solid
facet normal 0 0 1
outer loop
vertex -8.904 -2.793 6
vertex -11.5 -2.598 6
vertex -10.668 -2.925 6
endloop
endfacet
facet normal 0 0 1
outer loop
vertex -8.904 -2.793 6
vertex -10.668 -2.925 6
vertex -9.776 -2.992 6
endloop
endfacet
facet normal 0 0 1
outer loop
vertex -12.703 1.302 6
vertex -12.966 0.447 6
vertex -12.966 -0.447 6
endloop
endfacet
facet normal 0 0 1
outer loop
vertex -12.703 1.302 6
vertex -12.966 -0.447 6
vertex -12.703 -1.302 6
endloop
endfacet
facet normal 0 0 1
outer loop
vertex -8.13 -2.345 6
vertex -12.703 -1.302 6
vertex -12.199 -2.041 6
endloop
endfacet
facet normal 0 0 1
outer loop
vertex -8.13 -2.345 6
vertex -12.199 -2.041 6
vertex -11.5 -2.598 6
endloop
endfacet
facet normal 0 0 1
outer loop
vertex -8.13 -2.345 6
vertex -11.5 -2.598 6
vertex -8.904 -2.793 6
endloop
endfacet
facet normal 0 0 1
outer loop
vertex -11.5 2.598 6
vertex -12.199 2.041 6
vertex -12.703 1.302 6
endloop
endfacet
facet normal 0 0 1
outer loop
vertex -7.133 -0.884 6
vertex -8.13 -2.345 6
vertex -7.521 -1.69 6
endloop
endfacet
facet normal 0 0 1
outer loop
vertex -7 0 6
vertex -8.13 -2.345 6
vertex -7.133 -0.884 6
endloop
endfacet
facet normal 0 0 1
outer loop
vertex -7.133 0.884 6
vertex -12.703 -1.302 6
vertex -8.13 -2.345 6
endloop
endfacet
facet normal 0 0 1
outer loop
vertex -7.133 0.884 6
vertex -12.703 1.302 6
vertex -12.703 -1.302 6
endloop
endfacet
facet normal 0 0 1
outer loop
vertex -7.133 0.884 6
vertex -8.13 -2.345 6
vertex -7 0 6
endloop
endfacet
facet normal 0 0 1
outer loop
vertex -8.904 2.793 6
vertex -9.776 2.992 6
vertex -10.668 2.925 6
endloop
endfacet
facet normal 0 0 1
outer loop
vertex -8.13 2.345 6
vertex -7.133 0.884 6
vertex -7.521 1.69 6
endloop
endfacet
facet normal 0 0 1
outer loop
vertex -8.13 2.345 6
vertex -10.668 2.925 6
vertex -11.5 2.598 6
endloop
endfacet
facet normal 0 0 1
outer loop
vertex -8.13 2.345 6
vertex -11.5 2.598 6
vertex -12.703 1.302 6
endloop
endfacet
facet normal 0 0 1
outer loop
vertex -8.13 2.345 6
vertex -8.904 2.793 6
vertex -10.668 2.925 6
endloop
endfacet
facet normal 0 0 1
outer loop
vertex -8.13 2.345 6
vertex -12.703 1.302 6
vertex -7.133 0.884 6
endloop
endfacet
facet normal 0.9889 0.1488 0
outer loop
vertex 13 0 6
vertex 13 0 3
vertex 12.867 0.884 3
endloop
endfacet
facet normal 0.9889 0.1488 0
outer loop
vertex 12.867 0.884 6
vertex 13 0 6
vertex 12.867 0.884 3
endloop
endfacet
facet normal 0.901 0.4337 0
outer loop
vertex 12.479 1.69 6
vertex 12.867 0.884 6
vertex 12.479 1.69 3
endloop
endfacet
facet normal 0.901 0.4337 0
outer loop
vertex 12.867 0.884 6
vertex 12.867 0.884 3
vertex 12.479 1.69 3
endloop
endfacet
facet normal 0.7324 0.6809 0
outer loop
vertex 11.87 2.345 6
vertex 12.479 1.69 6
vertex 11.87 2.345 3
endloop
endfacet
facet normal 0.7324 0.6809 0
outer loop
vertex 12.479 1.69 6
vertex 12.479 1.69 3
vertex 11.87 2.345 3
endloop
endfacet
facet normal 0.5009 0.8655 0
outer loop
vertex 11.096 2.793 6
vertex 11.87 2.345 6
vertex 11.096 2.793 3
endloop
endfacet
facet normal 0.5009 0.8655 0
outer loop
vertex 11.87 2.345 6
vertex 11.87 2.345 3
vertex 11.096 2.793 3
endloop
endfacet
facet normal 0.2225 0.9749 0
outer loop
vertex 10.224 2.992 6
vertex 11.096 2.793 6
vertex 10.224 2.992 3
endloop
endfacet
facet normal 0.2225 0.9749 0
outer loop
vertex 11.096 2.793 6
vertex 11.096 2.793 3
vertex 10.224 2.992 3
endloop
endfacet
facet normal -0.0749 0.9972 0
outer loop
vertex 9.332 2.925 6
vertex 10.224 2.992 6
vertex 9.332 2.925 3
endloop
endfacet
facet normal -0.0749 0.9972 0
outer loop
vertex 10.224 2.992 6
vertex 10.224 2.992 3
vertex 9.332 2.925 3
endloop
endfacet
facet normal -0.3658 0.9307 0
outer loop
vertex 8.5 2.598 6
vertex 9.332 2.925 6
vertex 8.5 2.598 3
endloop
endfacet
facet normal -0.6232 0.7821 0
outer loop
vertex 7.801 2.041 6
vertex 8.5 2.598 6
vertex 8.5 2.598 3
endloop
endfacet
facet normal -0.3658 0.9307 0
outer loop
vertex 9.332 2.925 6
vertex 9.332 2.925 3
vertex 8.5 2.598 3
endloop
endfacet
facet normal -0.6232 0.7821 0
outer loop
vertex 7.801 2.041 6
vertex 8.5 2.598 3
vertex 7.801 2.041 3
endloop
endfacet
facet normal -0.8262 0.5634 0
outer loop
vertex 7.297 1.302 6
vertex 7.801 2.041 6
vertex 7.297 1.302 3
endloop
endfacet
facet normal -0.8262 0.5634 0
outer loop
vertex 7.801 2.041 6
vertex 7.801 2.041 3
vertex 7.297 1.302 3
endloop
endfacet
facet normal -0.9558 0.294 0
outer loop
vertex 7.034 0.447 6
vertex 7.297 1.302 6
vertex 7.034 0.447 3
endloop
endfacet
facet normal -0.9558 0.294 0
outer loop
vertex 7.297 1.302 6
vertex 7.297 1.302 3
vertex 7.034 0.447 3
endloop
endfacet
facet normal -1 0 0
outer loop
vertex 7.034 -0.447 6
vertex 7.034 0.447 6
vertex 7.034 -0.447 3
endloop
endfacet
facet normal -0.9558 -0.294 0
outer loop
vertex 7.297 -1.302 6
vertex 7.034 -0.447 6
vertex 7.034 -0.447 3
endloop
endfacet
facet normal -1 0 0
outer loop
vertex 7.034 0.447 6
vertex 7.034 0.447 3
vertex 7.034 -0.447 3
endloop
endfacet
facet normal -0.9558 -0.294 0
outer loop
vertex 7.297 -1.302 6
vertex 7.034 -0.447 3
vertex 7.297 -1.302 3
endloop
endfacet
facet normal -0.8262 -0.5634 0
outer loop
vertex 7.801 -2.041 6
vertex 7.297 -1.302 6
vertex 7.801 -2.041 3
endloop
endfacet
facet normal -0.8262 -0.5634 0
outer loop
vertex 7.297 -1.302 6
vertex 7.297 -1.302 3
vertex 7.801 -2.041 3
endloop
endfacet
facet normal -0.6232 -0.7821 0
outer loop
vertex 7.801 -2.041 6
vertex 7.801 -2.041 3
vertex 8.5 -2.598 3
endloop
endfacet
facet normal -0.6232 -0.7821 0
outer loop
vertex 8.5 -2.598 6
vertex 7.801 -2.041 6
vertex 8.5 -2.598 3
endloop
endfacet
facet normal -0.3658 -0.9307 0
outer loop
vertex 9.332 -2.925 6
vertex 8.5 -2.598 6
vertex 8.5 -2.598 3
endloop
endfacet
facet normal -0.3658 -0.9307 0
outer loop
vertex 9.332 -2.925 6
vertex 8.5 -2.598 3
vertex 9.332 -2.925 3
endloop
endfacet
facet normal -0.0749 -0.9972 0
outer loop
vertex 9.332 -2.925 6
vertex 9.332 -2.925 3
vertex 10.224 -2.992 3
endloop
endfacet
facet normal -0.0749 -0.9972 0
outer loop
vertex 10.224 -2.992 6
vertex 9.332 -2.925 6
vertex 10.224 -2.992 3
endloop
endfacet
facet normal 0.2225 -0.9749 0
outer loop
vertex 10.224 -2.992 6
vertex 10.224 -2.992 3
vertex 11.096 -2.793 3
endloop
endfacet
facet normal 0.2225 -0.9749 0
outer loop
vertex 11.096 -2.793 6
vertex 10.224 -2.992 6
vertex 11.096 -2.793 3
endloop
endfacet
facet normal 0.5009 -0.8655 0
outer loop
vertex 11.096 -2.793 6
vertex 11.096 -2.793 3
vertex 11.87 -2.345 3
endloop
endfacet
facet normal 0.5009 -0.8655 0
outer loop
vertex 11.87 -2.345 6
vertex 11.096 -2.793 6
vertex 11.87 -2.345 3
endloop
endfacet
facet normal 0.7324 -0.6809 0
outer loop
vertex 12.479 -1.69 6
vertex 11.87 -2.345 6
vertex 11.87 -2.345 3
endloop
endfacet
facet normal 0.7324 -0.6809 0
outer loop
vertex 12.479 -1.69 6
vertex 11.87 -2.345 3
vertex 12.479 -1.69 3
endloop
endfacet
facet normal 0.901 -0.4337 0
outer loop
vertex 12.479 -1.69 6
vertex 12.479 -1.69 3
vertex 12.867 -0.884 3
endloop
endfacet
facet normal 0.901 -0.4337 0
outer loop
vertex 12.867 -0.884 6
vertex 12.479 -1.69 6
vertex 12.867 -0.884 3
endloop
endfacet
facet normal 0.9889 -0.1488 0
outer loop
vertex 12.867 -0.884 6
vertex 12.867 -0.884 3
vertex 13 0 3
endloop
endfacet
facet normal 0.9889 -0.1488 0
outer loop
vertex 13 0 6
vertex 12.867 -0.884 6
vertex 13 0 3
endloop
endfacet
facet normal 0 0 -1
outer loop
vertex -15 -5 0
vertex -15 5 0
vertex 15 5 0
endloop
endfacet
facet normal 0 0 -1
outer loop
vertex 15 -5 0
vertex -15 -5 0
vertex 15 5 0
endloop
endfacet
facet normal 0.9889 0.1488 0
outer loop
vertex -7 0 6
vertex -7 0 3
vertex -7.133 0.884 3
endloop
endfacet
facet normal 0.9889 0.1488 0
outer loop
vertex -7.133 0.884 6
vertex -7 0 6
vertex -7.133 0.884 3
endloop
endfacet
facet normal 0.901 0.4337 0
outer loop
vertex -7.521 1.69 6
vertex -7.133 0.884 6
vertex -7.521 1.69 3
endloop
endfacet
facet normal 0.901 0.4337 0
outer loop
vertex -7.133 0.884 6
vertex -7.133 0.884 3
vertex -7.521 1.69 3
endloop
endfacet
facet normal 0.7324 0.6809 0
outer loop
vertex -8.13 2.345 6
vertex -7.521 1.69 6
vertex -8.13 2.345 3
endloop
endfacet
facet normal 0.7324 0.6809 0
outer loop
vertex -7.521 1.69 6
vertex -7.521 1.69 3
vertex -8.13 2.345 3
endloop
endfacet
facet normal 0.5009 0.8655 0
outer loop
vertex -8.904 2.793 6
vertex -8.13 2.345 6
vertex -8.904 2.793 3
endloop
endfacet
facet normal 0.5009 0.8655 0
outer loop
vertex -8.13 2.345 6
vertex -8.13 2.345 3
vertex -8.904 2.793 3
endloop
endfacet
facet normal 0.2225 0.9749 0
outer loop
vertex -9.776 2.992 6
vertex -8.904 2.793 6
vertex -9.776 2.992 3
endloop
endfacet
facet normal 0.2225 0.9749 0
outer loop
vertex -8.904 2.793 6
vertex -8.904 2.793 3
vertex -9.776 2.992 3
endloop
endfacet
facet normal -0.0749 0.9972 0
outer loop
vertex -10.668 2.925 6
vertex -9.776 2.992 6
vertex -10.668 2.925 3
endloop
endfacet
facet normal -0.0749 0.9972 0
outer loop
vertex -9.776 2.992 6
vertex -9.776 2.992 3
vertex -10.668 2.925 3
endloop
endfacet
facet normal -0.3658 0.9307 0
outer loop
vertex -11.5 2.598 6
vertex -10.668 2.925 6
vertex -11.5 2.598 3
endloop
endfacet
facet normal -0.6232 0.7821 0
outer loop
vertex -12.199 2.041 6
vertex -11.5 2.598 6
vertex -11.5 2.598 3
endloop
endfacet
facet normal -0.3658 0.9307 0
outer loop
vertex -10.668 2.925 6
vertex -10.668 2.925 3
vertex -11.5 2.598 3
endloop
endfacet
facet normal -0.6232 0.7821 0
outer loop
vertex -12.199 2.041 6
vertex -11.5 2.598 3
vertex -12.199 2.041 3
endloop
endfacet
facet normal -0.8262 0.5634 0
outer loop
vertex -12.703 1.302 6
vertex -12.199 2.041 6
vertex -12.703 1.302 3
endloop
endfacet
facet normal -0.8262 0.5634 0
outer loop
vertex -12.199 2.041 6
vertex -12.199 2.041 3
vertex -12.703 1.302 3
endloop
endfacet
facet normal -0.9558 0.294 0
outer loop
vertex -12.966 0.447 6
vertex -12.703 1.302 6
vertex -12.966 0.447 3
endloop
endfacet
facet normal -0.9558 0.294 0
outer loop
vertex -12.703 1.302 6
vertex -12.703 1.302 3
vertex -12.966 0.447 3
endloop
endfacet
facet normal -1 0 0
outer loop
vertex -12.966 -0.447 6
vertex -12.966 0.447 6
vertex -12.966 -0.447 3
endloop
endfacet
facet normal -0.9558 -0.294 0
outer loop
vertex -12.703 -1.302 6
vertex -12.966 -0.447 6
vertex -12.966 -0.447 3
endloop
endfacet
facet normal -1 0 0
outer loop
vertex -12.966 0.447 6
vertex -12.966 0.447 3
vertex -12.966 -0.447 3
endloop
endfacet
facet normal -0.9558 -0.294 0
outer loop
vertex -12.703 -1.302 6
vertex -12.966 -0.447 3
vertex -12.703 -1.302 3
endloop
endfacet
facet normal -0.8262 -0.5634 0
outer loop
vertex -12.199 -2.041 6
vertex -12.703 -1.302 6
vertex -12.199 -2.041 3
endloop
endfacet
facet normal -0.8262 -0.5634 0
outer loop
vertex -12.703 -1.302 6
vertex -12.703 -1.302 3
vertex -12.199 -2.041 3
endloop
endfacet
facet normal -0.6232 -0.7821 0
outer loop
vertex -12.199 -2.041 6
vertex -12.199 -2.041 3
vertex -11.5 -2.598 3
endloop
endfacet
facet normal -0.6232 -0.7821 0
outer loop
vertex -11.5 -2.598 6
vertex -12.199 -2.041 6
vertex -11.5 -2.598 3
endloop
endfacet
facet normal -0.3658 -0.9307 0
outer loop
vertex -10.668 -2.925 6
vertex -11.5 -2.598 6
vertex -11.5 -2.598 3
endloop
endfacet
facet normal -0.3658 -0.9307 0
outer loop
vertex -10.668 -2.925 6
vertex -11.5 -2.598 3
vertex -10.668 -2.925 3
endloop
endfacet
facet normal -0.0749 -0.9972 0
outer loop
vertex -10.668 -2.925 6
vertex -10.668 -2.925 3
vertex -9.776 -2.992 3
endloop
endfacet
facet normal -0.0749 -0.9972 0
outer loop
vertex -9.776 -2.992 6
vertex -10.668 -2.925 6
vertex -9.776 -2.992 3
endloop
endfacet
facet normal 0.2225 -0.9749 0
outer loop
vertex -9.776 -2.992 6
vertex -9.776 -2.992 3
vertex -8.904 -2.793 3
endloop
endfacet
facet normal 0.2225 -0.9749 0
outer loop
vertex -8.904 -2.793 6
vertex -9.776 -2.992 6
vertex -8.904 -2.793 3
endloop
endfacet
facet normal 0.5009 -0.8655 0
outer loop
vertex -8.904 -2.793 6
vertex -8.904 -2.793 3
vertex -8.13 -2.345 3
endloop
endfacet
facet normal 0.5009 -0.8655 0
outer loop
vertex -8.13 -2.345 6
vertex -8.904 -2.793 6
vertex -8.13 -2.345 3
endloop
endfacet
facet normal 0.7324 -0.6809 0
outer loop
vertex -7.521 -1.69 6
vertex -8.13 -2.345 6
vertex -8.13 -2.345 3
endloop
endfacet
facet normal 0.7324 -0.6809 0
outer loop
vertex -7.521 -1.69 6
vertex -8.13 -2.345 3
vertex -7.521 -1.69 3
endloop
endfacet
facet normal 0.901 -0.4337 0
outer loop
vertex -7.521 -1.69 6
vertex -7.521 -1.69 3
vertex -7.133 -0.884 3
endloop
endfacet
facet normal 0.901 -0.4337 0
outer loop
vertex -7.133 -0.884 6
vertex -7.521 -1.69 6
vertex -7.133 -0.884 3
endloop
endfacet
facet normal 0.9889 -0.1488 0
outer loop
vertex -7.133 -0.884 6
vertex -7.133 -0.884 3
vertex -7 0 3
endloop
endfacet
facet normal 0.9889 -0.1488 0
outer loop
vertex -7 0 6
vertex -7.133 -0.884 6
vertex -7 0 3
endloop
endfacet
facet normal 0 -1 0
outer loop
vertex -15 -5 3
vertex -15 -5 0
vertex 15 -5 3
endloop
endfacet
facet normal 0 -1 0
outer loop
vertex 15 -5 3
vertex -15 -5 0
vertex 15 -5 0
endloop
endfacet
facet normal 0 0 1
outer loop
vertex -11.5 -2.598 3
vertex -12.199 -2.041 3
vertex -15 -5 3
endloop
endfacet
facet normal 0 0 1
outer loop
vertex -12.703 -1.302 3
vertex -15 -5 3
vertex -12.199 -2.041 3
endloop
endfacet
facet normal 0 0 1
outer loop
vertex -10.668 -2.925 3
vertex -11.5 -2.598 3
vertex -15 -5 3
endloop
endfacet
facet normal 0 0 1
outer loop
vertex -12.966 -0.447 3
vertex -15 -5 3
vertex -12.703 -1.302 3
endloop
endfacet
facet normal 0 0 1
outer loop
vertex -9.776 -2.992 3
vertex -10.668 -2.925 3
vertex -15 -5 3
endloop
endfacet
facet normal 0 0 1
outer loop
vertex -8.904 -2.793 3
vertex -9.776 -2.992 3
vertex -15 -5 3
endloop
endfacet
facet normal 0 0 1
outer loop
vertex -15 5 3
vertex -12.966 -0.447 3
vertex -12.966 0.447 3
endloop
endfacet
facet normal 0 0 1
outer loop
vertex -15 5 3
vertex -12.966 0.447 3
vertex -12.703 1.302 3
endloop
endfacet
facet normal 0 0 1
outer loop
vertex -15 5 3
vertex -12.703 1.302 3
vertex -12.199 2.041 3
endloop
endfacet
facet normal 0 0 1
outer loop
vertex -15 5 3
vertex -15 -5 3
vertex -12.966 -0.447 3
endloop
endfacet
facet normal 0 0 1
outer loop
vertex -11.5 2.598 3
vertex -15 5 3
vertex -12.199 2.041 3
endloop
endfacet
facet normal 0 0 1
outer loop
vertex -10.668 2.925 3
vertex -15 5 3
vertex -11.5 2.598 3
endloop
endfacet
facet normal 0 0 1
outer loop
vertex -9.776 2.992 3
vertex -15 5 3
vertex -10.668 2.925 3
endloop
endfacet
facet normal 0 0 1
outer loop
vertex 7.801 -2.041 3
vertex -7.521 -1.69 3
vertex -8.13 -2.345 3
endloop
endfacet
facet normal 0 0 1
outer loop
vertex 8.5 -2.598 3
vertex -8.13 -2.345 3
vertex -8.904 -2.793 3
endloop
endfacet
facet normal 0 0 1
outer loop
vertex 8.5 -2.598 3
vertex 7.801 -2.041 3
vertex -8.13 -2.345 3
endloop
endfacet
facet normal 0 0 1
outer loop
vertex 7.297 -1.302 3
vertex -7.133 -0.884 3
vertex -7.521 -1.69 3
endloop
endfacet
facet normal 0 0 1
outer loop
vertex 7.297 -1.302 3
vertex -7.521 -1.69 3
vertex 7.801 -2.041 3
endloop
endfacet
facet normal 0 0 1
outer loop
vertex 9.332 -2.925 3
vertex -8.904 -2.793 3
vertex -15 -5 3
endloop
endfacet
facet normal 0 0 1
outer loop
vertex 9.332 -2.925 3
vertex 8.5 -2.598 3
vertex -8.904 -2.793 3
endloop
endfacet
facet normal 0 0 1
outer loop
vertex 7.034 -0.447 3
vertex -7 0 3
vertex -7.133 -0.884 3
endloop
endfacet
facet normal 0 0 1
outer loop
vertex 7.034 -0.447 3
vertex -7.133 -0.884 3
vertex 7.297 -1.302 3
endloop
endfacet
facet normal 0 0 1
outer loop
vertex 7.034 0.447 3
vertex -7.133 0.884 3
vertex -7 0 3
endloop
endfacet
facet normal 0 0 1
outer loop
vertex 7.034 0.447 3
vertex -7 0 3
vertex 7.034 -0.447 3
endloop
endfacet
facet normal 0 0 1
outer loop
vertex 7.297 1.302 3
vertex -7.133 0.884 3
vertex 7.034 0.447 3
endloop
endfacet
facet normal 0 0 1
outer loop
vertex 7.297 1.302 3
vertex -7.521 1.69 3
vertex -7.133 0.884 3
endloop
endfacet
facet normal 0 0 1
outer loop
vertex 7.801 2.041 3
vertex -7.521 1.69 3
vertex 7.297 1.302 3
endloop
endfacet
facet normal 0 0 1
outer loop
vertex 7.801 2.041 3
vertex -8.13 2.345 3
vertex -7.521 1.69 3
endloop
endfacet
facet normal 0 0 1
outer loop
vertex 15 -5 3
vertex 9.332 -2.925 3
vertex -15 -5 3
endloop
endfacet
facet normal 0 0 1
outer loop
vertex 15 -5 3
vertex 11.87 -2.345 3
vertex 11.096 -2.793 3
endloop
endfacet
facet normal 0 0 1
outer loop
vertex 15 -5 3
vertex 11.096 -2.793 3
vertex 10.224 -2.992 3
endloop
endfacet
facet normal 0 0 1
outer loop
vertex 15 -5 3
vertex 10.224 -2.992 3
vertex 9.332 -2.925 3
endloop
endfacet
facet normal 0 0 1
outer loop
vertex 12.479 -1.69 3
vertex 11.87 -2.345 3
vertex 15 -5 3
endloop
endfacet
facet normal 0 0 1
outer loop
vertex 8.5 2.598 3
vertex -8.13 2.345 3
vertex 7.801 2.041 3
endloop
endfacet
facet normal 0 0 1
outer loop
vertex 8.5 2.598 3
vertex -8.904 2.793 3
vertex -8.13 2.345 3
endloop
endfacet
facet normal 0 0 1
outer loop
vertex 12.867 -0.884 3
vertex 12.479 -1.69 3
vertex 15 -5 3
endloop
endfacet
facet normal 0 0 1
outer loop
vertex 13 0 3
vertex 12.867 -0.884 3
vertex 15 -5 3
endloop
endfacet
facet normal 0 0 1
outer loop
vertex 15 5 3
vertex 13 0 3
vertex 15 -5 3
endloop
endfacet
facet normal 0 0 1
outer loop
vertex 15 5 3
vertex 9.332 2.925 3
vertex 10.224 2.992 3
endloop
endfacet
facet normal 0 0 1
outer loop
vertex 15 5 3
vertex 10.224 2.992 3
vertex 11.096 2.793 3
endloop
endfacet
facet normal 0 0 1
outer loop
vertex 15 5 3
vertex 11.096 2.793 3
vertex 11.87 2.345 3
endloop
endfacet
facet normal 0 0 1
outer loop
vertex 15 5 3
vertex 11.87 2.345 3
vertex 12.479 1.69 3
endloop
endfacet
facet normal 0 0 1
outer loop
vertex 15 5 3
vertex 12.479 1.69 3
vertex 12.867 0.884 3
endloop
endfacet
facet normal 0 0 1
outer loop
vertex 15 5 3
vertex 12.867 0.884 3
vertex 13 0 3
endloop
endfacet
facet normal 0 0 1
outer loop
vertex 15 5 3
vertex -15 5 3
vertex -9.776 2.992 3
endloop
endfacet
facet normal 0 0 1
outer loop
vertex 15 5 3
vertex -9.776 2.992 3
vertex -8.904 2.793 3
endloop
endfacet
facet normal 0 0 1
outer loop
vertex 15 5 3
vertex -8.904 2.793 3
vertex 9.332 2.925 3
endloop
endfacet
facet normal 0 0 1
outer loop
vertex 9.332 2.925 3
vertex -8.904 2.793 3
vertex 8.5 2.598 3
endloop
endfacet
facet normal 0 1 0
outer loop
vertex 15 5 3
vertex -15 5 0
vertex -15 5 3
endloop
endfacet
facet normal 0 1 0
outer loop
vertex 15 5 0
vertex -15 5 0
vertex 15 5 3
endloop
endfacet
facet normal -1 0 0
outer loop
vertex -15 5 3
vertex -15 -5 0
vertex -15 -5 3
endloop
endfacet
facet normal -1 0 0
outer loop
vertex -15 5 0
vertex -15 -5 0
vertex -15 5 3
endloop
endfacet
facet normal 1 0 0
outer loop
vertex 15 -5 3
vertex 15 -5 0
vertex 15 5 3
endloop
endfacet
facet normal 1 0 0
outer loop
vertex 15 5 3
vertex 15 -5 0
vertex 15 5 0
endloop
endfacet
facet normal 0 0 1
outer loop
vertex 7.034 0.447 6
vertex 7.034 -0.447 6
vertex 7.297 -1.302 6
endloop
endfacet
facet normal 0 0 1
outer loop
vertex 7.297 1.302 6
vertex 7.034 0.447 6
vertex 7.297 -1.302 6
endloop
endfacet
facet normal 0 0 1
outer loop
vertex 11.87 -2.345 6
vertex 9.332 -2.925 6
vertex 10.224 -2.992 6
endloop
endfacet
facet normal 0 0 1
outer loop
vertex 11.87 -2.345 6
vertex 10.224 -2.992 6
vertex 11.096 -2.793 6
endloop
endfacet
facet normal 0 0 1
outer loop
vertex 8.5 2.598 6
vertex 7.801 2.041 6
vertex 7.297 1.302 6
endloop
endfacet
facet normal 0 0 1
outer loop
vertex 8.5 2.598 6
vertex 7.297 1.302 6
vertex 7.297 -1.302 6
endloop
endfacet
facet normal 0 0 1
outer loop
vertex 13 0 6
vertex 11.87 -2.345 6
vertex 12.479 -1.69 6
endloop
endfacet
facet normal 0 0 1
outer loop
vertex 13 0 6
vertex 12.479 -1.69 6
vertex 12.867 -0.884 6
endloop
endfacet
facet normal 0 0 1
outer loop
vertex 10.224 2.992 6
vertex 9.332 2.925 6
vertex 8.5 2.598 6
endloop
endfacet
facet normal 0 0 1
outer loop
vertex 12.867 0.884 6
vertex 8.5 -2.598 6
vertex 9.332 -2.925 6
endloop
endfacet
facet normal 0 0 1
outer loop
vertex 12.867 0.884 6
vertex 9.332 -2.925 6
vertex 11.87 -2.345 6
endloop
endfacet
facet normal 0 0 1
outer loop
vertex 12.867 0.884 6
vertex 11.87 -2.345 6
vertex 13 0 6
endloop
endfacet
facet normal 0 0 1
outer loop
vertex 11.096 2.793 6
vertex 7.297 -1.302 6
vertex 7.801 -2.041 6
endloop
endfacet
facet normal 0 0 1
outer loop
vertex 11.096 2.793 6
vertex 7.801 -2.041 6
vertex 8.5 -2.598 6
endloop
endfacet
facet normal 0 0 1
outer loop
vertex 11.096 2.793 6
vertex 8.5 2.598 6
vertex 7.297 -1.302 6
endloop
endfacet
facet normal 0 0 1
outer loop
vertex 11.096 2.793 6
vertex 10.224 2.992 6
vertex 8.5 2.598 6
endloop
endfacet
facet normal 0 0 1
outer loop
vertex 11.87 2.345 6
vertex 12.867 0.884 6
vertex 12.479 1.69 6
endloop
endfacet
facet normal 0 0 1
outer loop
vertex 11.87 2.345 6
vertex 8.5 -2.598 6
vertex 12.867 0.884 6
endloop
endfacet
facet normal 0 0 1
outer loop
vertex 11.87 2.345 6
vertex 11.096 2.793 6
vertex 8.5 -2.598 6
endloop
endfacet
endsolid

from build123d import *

# Parameters (mm, degrees)
F0_W     = 30
F0_H     = 10
F0_R     = 3
F1_DEPTH = 3
F2_DEPTH = 6


with BuildPart() as f1:
    # F0 (on Top) → F1 (new body)
    with BuildSketch(Plane.XY):
        Rectangle(F0_W, F0_H)
        with Locations((-10, 0)):
            Circle(F0_R, mode=Mode.SUBTRACT)
        with Locations((10, 0)):
            Circle(F0_R, mode=Mode.SUBTRACT)
        with Locations((10, 0)):
            Circle(F0_R)
        with Locations((-10, 0)):
            Circle(F0_R)
    extrude(amount=F1_DEPTH)

    # F0 (on Top) → F2 (join)
    with BuildSketch(Plane.XY):
        with Locations((-10, 0)):
            Circle(F0_R)
        with Locations((10, 0)):
            Circle(F0_R)
    extrude(amount=F2_DEPTH)


solid = f1.part
